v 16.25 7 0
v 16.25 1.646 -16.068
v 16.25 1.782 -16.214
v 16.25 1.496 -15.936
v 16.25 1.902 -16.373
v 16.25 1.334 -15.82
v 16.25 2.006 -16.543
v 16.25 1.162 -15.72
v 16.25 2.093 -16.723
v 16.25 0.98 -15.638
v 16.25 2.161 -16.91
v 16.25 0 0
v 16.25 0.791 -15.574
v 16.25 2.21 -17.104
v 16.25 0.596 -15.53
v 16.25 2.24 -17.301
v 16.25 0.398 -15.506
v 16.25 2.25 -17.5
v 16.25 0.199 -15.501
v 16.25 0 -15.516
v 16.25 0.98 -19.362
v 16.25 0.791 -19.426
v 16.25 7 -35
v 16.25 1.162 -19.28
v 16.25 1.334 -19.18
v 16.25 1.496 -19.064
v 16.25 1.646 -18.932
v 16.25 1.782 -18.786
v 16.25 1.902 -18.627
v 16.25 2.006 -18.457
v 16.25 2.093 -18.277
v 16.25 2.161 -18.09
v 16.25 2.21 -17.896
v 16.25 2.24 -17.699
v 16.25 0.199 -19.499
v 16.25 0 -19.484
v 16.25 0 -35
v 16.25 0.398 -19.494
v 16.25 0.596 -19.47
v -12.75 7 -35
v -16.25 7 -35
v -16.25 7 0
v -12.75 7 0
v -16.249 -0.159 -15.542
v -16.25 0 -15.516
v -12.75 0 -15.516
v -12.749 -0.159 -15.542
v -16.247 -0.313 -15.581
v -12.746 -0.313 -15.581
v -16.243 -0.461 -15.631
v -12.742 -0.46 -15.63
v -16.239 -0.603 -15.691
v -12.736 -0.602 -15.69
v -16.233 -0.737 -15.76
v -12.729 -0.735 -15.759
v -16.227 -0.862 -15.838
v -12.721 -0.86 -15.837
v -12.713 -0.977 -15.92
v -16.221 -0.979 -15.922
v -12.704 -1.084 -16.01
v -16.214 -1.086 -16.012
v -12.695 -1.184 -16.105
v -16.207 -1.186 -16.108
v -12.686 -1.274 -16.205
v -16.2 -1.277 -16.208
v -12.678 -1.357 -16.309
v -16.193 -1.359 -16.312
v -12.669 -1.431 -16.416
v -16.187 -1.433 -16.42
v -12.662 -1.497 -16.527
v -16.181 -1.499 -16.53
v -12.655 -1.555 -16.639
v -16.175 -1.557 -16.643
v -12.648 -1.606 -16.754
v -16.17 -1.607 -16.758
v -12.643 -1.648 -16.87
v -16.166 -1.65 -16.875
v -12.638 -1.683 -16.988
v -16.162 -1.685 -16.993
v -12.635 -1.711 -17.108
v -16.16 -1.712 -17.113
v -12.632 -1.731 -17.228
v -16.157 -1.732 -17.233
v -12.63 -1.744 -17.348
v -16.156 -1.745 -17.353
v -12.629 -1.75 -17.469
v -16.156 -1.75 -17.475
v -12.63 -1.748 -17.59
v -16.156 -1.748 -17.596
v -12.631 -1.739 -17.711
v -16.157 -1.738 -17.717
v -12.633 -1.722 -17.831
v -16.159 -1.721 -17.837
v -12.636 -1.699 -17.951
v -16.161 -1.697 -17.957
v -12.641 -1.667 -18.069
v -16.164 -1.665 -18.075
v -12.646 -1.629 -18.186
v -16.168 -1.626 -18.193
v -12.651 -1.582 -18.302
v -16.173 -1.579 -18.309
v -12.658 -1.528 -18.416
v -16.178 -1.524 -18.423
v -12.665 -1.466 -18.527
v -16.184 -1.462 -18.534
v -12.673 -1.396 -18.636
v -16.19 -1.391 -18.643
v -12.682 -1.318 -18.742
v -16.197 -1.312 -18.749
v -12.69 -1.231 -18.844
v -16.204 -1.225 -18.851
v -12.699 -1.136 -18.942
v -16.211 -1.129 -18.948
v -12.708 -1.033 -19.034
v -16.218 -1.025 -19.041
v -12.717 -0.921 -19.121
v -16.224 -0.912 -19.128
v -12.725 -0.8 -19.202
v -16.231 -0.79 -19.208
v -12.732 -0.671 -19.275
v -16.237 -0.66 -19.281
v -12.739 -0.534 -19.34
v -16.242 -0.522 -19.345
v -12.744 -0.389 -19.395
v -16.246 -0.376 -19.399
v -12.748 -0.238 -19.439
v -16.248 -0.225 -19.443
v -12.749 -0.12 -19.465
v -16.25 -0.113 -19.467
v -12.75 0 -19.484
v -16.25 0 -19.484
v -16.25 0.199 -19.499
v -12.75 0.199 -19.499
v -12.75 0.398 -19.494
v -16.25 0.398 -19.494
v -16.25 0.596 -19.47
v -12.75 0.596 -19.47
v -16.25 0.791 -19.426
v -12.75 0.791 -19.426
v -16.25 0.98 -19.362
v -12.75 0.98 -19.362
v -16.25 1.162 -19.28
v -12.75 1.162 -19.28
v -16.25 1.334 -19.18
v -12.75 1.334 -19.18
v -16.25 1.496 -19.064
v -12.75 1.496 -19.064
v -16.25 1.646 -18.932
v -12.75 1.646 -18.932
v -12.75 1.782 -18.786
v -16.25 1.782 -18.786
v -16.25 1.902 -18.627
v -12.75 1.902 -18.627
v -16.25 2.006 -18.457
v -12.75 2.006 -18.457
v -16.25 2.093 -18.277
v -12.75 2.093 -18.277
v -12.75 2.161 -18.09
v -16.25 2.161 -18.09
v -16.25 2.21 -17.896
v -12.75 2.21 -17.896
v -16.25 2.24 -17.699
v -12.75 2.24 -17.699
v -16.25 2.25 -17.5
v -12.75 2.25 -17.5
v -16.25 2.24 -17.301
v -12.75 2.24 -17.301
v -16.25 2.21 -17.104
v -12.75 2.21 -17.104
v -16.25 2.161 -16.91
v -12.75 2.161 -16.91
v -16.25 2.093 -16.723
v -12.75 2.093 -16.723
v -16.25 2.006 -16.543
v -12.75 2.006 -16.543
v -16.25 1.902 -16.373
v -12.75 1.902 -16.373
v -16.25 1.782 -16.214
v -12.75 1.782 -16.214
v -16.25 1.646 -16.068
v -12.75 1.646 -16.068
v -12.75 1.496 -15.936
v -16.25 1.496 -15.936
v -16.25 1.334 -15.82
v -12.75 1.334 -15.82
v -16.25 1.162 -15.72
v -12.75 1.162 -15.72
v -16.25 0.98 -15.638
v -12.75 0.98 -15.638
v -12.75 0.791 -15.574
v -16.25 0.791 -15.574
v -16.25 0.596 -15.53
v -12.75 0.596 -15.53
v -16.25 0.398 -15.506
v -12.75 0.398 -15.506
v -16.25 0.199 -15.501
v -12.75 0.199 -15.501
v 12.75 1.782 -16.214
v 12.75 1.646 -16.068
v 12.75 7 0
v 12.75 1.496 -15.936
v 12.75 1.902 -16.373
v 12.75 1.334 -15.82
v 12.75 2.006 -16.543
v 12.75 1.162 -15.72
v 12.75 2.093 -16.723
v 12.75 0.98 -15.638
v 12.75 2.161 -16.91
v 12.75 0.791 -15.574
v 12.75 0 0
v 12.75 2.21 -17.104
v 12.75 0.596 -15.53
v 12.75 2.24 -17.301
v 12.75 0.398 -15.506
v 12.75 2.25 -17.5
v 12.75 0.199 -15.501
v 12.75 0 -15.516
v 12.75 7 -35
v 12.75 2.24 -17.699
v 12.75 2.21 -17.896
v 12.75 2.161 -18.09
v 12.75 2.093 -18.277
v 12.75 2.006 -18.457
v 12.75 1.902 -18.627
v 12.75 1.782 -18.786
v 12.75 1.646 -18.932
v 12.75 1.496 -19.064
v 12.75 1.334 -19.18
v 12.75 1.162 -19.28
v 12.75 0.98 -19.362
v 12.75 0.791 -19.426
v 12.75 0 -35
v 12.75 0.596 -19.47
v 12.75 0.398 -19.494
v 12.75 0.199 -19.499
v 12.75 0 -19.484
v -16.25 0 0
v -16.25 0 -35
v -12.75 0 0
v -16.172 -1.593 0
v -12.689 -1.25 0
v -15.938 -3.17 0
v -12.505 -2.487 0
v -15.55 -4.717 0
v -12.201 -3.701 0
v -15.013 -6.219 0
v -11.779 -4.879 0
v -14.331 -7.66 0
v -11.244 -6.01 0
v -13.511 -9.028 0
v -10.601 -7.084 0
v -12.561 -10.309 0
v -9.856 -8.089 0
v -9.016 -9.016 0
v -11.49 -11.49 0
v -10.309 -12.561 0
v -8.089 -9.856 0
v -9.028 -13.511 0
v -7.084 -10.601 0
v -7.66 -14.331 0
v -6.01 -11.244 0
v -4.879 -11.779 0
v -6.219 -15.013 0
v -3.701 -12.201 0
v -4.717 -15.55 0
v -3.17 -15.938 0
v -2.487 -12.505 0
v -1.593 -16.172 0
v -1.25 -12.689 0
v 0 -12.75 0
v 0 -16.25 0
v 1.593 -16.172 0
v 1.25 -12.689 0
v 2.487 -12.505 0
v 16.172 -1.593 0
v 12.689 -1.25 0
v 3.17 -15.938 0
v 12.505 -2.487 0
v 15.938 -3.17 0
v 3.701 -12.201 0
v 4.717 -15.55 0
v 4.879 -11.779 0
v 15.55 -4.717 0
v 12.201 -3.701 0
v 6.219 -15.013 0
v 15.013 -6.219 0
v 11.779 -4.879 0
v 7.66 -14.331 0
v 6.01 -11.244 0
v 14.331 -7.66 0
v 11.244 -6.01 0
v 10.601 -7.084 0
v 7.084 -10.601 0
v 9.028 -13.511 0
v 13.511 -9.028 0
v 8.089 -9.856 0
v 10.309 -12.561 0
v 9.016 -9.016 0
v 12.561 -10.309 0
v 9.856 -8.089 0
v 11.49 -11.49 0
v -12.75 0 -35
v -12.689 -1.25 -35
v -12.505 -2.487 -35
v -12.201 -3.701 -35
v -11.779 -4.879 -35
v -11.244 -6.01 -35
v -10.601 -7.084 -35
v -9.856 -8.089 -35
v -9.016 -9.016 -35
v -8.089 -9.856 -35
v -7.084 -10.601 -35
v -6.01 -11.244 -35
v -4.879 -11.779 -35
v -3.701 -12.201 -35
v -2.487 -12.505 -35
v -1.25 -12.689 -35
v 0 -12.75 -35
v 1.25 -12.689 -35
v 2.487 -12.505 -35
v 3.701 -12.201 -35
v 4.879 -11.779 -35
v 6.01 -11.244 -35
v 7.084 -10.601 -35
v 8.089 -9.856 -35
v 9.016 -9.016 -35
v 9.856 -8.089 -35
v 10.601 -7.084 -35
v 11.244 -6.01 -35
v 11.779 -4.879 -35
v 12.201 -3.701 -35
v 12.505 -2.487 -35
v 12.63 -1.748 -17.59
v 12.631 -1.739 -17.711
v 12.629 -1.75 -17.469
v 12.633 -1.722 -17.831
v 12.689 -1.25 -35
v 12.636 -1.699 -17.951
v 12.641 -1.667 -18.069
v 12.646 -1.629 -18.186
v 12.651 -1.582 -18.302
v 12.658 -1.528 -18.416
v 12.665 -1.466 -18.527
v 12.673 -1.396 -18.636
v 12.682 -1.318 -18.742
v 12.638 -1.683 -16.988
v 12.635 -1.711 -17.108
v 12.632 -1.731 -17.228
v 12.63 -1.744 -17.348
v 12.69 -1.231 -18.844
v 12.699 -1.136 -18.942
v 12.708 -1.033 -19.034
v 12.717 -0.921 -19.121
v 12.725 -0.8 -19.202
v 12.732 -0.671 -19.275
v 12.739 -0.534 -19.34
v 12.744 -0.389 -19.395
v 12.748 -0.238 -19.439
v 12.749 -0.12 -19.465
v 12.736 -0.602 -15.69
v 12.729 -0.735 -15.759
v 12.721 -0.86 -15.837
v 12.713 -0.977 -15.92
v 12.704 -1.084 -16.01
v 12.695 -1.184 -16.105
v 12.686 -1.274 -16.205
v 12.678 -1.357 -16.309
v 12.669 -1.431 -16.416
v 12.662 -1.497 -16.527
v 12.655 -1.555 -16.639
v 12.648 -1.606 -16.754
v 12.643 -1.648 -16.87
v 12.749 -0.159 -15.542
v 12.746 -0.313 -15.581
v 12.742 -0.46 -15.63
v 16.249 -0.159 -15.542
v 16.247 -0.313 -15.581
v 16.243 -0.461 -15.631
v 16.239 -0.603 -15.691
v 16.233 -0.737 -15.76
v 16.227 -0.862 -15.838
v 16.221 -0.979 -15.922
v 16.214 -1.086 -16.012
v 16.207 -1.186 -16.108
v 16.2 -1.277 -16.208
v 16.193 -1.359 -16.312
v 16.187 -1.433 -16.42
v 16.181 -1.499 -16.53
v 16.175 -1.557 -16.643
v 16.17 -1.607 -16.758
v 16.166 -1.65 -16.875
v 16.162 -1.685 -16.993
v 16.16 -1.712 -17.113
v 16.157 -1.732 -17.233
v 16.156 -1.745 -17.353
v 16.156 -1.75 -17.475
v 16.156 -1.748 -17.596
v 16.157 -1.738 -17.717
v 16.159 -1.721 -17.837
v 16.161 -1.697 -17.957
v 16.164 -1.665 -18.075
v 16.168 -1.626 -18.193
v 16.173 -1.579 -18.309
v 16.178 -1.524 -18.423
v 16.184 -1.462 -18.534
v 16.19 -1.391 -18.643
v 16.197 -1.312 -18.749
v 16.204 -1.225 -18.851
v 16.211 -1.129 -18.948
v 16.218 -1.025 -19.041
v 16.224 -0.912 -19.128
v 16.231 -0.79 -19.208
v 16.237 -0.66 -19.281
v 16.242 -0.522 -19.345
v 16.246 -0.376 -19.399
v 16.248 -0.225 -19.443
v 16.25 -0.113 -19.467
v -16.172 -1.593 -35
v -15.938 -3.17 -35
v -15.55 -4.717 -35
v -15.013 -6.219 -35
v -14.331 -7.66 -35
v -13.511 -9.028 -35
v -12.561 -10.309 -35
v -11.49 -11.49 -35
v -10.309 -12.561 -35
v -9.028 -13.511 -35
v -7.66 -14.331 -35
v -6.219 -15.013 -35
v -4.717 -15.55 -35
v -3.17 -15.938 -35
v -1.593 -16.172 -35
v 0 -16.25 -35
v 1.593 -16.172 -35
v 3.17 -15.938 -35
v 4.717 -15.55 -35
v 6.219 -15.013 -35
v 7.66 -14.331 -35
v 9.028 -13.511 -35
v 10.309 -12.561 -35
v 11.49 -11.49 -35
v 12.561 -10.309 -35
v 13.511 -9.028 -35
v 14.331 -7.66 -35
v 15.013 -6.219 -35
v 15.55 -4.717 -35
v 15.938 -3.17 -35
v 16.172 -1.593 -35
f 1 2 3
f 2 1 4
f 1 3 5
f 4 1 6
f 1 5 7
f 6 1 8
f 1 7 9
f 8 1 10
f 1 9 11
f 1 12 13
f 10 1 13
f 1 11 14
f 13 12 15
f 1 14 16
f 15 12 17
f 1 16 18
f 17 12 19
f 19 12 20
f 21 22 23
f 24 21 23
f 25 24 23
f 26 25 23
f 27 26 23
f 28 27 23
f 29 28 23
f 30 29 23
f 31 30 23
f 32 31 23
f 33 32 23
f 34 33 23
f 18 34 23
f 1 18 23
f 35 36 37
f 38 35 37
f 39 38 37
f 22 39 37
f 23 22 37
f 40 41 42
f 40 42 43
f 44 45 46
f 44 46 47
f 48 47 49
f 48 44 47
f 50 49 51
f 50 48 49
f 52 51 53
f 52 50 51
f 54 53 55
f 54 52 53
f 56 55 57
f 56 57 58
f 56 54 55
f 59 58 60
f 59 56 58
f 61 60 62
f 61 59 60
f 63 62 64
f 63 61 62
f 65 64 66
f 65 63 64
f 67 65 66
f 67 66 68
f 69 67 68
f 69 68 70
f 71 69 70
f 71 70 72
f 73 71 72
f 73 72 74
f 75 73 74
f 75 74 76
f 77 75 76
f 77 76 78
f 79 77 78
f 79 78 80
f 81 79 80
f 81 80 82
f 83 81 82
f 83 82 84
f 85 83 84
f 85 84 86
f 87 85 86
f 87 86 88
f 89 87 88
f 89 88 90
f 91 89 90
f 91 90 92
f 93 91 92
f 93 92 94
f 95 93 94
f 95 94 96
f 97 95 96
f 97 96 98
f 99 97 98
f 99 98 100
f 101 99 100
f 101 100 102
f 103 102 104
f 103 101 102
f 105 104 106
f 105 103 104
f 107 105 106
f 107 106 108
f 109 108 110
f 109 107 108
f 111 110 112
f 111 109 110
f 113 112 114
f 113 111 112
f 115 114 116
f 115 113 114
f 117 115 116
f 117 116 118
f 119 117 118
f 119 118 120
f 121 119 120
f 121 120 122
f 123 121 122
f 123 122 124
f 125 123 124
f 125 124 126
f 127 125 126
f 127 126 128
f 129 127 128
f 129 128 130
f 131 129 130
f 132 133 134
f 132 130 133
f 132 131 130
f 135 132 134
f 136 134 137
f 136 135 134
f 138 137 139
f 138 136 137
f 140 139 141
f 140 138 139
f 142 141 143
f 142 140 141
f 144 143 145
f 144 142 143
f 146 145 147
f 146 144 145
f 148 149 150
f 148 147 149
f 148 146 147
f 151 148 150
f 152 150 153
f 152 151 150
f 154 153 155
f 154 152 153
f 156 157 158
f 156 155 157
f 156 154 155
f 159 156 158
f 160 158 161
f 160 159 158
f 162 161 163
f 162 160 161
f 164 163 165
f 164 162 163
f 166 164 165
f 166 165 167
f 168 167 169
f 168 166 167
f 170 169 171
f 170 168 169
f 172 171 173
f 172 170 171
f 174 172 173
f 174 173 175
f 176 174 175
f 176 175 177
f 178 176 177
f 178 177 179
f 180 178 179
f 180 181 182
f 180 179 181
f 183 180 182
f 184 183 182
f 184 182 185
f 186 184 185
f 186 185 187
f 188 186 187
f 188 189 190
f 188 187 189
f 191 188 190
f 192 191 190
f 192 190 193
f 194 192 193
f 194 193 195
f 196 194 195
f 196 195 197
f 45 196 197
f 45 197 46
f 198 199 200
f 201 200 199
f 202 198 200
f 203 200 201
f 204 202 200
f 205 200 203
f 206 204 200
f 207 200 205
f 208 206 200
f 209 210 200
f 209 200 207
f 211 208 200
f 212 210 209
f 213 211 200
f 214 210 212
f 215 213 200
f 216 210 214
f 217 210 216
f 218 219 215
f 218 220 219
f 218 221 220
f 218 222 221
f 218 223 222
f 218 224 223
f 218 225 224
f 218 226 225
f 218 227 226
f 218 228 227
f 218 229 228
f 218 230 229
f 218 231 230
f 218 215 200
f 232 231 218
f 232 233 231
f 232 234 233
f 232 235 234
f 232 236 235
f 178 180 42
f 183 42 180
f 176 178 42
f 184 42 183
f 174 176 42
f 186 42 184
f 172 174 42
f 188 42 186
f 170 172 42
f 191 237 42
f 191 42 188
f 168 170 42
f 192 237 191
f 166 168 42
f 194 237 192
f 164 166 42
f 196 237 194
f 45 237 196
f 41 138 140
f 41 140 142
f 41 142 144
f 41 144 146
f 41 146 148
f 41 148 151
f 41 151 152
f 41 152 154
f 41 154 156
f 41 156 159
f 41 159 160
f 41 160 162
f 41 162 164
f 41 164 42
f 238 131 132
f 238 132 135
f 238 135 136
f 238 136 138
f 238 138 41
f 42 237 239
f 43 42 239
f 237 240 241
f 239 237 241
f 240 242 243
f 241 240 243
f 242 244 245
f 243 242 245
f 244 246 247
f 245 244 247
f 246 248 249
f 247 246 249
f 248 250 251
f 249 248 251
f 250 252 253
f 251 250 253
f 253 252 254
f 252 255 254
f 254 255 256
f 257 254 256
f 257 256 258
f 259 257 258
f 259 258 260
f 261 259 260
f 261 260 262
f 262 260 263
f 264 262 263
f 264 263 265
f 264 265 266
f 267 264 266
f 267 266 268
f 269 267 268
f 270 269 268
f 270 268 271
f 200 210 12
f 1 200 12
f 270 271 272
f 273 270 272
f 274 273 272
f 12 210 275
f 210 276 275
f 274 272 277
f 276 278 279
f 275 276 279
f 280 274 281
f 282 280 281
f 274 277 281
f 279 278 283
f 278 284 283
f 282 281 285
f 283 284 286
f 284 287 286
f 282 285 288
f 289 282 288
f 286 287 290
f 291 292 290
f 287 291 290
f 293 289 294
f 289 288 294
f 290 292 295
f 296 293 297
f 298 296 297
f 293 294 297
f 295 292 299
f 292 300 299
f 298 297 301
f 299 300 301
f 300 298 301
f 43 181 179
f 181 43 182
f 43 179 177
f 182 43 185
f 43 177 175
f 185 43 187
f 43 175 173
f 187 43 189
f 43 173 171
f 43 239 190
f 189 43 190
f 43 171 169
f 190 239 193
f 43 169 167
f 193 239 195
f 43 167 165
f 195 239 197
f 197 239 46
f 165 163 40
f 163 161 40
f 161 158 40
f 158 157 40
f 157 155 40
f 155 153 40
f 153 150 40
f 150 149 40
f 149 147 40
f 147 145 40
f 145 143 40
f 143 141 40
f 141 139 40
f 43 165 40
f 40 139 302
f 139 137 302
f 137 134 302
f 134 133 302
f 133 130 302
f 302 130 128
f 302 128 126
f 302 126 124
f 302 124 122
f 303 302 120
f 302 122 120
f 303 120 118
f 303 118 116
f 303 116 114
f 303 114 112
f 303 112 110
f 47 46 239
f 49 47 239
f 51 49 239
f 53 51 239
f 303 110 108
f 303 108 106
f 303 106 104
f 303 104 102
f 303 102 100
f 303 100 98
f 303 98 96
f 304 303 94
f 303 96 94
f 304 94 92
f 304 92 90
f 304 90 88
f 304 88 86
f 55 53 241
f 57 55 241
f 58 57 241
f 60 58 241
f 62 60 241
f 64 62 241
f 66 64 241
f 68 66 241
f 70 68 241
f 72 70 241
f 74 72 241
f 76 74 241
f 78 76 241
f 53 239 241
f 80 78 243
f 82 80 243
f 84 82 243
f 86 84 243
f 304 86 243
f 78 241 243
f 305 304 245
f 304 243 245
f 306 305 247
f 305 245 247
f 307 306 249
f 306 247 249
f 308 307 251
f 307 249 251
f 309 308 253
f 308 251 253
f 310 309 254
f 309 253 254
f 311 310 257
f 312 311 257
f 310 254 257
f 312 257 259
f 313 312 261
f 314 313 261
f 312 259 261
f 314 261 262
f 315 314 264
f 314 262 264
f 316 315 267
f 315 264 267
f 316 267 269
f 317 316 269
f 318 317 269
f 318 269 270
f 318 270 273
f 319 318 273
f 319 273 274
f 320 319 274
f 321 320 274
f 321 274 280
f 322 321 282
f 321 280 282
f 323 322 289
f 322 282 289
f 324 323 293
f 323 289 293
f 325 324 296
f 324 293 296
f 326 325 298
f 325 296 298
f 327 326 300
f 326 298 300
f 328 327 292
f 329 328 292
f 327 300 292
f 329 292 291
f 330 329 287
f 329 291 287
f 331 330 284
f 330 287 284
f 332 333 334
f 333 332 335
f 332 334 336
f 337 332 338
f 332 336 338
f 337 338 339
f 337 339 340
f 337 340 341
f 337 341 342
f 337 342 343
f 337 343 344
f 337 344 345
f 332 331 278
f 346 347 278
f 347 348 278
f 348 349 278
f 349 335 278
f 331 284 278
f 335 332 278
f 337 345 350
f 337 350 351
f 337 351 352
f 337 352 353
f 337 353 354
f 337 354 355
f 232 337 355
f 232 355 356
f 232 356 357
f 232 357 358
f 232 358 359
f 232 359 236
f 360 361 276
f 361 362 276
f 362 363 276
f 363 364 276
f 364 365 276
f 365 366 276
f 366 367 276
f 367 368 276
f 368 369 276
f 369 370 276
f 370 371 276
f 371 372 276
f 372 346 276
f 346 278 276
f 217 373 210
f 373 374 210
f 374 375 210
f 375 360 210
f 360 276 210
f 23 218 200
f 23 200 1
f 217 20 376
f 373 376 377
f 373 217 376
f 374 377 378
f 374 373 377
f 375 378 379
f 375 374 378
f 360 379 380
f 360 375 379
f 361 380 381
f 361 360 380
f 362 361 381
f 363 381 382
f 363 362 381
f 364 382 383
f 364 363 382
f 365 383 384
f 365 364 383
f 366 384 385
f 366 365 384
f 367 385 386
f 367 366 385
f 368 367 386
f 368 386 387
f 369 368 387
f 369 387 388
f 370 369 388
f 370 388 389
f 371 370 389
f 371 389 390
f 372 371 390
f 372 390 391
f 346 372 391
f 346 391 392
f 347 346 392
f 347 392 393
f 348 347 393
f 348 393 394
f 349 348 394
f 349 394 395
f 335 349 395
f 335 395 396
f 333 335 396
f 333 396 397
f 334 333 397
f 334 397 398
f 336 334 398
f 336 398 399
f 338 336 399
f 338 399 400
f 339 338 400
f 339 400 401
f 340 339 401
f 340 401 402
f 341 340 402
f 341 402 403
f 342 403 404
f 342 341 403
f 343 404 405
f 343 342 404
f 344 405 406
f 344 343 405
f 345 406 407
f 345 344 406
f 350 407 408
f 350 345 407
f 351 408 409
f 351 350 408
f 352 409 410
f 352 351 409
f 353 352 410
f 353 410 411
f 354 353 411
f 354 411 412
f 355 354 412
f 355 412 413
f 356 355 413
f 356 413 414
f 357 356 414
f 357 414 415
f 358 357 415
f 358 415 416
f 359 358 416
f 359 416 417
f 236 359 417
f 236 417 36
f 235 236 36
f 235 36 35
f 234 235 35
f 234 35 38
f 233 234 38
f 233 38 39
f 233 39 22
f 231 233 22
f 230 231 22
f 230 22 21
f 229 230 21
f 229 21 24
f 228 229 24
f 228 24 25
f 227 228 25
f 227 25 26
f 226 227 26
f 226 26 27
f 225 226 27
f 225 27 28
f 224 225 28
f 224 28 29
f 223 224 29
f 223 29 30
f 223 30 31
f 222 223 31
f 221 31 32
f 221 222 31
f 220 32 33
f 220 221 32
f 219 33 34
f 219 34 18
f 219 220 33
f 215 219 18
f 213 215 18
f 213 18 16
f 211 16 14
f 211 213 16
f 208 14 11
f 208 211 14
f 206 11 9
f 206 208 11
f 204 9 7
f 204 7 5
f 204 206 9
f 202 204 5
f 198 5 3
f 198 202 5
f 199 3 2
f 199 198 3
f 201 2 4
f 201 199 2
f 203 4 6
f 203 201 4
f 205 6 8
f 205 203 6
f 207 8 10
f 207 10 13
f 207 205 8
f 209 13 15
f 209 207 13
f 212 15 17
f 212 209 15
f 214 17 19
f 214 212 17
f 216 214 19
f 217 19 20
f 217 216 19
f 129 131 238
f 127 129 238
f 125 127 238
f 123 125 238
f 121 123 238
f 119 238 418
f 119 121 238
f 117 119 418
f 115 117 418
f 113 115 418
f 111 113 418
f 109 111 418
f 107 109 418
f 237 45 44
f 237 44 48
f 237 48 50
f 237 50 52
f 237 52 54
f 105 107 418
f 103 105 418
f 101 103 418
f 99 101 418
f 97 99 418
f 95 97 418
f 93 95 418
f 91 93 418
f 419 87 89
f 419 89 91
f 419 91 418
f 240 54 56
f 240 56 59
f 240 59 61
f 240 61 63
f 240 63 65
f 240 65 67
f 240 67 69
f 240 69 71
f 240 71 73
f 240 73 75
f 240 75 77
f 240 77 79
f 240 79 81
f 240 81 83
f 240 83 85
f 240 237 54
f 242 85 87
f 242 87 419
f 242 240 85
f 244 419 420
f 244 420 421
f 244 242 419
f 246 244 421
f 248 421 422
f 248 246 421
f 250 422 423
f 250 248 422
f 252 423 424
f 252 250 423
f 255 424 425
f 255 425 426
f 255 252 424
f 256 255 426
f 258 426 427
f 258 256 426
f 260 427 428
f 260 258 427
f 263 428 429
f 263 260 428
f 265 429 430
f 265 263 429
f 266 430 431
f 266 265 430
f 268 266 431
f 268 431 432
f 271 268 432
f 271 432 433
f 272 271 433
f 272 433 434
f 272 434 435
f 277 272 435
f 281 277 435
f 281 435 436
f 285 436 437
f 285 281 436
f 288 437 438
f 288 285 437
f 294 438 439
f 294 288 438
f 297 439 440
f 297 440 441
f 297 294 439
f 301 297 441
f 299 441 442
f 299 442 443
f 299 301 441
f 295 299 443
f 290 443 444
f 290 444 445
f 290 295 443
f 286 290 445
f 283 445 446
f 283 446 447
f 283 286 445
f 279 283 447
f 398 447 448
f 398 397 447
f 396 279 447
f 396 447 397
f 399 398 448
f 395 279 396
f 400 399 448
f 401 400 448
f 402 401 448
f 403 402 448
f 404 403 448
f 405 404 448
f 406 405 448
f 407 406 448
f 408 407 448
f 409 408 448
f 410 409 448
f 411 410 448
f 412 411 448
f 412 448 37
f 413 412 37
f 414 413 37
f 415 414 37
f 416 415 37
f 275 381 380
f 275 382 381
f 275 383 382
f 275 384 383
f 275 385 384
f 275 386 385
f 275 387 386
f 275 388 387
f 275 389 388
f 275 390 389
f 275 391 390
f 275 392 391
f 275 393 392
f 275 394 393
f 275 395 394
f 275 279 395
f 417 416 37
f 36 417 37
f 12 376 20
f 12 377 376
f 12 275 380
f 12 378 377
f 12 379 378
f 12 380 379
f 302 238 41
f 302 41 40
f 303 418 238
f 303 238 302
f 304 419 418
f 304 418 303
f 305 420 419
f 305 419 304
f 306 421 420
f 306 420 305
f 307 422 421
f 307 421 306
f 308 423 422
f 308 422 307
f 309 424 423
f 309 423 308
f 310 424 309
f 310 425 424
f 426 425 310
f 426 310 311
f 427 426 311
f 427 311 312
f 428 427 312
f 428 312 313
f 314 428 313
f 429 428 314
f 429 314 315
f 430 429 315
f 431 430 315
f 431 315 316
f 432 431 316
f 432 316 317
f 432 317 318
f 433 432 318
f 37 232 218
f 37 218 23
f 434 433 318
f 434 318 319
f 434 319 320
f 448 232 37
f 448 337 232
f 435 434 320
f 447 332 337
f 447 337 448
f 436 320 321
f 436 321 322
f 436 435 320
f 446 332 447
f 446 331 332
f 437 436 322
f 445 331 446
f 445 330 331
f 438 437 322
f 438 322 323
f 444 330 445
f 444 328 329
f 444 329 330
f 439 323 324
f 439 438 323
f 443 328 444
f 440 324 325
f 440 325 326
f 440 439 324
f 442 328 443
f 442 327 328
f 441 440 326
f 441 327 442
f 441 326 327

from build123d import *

# Parameters (mm, degrees)
SKETCH1_R           = 16.25
BOSS_EXTRUDE1_DEPTH = 35
SKETCH2_R           = 12.75
CUT_EXTRUDE1_DEPTH  = 35
SKETCH7_W           = 32.720020464
SKETCH7_H           = 16.591035764
CUT_EXTRUDE2_DEPTH  = 17.5
SKETCH9_W           = 32.5
SKETCH9_H           = 35
BOSS_EXTRUDE2_DEPTH = 7
SKETCH10_W          = 25.5
SKETCH10_H          = 35
CUT_EXTRUDE3_DEPTH  = 7
SKETCH15_R          = 2
CUT_EXTRUDE5_DEPTH  = 4
CUT_EXTRUDE6_START  = -4
SKETCH14_R          = 2
CUT_EXTRUDE6_DEPTH  = 4


with BuildPart() as part:
    # Sketch1 → Boss-Extrude1 (new body)
    with BuildSketch(Plane.XY):
        Circle(SKETCH1_R)
    extrude(amount=-BOSS_EXTRUDE1_DEPTH)

    # Sketch2 → Cut-Extrude1 (cut)
    with BuildSketch(Plane.XY):
        Circle(SKETCH2_R)
    extrude(amount=-CUT_EXTRUDE1_DEPTH, mode=Mode.SUBTRACT)

    # Sketch7 → Cut-Extrude2 (cut, symmetric)
    with BuildSketch(Plane.XY.offset(-17.5)):
        with Locations((-0.110010232, 8.295517882)):
            Rectangle(SKETCH7_W, SKETCH7_H)
    extrude(amount=CUT_EXTRUDE2_DEPTH, both=True, mode=Mode.SUBTRACT)

    # Sketch9 → Boss-Extrude2 (add)
    with BuildSketch(Plane(origin=(0, 0, 0), x_dir=(1, 0, 0), z_dir=(0, 1, 0))):
        with Locations((0, 17.5)):
            Rectangle(SKETCH9_W, SKETCH9_H)
    extrude(amount=BOSS_EXTRUDE2_DEPTH)

    # Sketch10 → Cut-Extrude3 (cut)
    with BuildSketch(Plane(origin=(0, 0, 0), x_dir=(1, 0, 0), z_dir=(0, 1, 0))):
        with Locations((0, 17.5)):
            Rectangle(SKETCH10_W, SKETCH10_H)
    extrude(amount=CUT_EXTRUDE3_DEPTH, mode=Mode.SUBTRACT)

    # Sketch15 → Cut-Extrude5 (cut)
    with BuildSketch(Plane(origin=(-16.25, 0, 0), x_dir=(0, 0, -1), z_dir=(1, 0, 0))):
        with Locations(Location((17.5, 0.25, 0), (0, 0, 187.180755781))):
            Circle(SKETCH15_R)
    extrude(amount=CUT_EXTRUDE5_DEPTH, mode=Mode.SUBTRACT)

    # Sketch14 → Cut-Extrude6 (cut)
    with BuildSketch(Plane(origin=(16.25, 0, 0), x_dir=(0, 0, -1), z_dir=(1, 0, 0)).offset(CUT_EXTRUDE6_START)):
        with Locations(Location((17.5, 0.25, 0), (0, 0, 187.180755781))):
            Circle(SKETCH14_R)
    extrude(amount=CUT_EXTRUDE6_DEPTH, mode=Mode.SUBTRACT)


solid = part.part
